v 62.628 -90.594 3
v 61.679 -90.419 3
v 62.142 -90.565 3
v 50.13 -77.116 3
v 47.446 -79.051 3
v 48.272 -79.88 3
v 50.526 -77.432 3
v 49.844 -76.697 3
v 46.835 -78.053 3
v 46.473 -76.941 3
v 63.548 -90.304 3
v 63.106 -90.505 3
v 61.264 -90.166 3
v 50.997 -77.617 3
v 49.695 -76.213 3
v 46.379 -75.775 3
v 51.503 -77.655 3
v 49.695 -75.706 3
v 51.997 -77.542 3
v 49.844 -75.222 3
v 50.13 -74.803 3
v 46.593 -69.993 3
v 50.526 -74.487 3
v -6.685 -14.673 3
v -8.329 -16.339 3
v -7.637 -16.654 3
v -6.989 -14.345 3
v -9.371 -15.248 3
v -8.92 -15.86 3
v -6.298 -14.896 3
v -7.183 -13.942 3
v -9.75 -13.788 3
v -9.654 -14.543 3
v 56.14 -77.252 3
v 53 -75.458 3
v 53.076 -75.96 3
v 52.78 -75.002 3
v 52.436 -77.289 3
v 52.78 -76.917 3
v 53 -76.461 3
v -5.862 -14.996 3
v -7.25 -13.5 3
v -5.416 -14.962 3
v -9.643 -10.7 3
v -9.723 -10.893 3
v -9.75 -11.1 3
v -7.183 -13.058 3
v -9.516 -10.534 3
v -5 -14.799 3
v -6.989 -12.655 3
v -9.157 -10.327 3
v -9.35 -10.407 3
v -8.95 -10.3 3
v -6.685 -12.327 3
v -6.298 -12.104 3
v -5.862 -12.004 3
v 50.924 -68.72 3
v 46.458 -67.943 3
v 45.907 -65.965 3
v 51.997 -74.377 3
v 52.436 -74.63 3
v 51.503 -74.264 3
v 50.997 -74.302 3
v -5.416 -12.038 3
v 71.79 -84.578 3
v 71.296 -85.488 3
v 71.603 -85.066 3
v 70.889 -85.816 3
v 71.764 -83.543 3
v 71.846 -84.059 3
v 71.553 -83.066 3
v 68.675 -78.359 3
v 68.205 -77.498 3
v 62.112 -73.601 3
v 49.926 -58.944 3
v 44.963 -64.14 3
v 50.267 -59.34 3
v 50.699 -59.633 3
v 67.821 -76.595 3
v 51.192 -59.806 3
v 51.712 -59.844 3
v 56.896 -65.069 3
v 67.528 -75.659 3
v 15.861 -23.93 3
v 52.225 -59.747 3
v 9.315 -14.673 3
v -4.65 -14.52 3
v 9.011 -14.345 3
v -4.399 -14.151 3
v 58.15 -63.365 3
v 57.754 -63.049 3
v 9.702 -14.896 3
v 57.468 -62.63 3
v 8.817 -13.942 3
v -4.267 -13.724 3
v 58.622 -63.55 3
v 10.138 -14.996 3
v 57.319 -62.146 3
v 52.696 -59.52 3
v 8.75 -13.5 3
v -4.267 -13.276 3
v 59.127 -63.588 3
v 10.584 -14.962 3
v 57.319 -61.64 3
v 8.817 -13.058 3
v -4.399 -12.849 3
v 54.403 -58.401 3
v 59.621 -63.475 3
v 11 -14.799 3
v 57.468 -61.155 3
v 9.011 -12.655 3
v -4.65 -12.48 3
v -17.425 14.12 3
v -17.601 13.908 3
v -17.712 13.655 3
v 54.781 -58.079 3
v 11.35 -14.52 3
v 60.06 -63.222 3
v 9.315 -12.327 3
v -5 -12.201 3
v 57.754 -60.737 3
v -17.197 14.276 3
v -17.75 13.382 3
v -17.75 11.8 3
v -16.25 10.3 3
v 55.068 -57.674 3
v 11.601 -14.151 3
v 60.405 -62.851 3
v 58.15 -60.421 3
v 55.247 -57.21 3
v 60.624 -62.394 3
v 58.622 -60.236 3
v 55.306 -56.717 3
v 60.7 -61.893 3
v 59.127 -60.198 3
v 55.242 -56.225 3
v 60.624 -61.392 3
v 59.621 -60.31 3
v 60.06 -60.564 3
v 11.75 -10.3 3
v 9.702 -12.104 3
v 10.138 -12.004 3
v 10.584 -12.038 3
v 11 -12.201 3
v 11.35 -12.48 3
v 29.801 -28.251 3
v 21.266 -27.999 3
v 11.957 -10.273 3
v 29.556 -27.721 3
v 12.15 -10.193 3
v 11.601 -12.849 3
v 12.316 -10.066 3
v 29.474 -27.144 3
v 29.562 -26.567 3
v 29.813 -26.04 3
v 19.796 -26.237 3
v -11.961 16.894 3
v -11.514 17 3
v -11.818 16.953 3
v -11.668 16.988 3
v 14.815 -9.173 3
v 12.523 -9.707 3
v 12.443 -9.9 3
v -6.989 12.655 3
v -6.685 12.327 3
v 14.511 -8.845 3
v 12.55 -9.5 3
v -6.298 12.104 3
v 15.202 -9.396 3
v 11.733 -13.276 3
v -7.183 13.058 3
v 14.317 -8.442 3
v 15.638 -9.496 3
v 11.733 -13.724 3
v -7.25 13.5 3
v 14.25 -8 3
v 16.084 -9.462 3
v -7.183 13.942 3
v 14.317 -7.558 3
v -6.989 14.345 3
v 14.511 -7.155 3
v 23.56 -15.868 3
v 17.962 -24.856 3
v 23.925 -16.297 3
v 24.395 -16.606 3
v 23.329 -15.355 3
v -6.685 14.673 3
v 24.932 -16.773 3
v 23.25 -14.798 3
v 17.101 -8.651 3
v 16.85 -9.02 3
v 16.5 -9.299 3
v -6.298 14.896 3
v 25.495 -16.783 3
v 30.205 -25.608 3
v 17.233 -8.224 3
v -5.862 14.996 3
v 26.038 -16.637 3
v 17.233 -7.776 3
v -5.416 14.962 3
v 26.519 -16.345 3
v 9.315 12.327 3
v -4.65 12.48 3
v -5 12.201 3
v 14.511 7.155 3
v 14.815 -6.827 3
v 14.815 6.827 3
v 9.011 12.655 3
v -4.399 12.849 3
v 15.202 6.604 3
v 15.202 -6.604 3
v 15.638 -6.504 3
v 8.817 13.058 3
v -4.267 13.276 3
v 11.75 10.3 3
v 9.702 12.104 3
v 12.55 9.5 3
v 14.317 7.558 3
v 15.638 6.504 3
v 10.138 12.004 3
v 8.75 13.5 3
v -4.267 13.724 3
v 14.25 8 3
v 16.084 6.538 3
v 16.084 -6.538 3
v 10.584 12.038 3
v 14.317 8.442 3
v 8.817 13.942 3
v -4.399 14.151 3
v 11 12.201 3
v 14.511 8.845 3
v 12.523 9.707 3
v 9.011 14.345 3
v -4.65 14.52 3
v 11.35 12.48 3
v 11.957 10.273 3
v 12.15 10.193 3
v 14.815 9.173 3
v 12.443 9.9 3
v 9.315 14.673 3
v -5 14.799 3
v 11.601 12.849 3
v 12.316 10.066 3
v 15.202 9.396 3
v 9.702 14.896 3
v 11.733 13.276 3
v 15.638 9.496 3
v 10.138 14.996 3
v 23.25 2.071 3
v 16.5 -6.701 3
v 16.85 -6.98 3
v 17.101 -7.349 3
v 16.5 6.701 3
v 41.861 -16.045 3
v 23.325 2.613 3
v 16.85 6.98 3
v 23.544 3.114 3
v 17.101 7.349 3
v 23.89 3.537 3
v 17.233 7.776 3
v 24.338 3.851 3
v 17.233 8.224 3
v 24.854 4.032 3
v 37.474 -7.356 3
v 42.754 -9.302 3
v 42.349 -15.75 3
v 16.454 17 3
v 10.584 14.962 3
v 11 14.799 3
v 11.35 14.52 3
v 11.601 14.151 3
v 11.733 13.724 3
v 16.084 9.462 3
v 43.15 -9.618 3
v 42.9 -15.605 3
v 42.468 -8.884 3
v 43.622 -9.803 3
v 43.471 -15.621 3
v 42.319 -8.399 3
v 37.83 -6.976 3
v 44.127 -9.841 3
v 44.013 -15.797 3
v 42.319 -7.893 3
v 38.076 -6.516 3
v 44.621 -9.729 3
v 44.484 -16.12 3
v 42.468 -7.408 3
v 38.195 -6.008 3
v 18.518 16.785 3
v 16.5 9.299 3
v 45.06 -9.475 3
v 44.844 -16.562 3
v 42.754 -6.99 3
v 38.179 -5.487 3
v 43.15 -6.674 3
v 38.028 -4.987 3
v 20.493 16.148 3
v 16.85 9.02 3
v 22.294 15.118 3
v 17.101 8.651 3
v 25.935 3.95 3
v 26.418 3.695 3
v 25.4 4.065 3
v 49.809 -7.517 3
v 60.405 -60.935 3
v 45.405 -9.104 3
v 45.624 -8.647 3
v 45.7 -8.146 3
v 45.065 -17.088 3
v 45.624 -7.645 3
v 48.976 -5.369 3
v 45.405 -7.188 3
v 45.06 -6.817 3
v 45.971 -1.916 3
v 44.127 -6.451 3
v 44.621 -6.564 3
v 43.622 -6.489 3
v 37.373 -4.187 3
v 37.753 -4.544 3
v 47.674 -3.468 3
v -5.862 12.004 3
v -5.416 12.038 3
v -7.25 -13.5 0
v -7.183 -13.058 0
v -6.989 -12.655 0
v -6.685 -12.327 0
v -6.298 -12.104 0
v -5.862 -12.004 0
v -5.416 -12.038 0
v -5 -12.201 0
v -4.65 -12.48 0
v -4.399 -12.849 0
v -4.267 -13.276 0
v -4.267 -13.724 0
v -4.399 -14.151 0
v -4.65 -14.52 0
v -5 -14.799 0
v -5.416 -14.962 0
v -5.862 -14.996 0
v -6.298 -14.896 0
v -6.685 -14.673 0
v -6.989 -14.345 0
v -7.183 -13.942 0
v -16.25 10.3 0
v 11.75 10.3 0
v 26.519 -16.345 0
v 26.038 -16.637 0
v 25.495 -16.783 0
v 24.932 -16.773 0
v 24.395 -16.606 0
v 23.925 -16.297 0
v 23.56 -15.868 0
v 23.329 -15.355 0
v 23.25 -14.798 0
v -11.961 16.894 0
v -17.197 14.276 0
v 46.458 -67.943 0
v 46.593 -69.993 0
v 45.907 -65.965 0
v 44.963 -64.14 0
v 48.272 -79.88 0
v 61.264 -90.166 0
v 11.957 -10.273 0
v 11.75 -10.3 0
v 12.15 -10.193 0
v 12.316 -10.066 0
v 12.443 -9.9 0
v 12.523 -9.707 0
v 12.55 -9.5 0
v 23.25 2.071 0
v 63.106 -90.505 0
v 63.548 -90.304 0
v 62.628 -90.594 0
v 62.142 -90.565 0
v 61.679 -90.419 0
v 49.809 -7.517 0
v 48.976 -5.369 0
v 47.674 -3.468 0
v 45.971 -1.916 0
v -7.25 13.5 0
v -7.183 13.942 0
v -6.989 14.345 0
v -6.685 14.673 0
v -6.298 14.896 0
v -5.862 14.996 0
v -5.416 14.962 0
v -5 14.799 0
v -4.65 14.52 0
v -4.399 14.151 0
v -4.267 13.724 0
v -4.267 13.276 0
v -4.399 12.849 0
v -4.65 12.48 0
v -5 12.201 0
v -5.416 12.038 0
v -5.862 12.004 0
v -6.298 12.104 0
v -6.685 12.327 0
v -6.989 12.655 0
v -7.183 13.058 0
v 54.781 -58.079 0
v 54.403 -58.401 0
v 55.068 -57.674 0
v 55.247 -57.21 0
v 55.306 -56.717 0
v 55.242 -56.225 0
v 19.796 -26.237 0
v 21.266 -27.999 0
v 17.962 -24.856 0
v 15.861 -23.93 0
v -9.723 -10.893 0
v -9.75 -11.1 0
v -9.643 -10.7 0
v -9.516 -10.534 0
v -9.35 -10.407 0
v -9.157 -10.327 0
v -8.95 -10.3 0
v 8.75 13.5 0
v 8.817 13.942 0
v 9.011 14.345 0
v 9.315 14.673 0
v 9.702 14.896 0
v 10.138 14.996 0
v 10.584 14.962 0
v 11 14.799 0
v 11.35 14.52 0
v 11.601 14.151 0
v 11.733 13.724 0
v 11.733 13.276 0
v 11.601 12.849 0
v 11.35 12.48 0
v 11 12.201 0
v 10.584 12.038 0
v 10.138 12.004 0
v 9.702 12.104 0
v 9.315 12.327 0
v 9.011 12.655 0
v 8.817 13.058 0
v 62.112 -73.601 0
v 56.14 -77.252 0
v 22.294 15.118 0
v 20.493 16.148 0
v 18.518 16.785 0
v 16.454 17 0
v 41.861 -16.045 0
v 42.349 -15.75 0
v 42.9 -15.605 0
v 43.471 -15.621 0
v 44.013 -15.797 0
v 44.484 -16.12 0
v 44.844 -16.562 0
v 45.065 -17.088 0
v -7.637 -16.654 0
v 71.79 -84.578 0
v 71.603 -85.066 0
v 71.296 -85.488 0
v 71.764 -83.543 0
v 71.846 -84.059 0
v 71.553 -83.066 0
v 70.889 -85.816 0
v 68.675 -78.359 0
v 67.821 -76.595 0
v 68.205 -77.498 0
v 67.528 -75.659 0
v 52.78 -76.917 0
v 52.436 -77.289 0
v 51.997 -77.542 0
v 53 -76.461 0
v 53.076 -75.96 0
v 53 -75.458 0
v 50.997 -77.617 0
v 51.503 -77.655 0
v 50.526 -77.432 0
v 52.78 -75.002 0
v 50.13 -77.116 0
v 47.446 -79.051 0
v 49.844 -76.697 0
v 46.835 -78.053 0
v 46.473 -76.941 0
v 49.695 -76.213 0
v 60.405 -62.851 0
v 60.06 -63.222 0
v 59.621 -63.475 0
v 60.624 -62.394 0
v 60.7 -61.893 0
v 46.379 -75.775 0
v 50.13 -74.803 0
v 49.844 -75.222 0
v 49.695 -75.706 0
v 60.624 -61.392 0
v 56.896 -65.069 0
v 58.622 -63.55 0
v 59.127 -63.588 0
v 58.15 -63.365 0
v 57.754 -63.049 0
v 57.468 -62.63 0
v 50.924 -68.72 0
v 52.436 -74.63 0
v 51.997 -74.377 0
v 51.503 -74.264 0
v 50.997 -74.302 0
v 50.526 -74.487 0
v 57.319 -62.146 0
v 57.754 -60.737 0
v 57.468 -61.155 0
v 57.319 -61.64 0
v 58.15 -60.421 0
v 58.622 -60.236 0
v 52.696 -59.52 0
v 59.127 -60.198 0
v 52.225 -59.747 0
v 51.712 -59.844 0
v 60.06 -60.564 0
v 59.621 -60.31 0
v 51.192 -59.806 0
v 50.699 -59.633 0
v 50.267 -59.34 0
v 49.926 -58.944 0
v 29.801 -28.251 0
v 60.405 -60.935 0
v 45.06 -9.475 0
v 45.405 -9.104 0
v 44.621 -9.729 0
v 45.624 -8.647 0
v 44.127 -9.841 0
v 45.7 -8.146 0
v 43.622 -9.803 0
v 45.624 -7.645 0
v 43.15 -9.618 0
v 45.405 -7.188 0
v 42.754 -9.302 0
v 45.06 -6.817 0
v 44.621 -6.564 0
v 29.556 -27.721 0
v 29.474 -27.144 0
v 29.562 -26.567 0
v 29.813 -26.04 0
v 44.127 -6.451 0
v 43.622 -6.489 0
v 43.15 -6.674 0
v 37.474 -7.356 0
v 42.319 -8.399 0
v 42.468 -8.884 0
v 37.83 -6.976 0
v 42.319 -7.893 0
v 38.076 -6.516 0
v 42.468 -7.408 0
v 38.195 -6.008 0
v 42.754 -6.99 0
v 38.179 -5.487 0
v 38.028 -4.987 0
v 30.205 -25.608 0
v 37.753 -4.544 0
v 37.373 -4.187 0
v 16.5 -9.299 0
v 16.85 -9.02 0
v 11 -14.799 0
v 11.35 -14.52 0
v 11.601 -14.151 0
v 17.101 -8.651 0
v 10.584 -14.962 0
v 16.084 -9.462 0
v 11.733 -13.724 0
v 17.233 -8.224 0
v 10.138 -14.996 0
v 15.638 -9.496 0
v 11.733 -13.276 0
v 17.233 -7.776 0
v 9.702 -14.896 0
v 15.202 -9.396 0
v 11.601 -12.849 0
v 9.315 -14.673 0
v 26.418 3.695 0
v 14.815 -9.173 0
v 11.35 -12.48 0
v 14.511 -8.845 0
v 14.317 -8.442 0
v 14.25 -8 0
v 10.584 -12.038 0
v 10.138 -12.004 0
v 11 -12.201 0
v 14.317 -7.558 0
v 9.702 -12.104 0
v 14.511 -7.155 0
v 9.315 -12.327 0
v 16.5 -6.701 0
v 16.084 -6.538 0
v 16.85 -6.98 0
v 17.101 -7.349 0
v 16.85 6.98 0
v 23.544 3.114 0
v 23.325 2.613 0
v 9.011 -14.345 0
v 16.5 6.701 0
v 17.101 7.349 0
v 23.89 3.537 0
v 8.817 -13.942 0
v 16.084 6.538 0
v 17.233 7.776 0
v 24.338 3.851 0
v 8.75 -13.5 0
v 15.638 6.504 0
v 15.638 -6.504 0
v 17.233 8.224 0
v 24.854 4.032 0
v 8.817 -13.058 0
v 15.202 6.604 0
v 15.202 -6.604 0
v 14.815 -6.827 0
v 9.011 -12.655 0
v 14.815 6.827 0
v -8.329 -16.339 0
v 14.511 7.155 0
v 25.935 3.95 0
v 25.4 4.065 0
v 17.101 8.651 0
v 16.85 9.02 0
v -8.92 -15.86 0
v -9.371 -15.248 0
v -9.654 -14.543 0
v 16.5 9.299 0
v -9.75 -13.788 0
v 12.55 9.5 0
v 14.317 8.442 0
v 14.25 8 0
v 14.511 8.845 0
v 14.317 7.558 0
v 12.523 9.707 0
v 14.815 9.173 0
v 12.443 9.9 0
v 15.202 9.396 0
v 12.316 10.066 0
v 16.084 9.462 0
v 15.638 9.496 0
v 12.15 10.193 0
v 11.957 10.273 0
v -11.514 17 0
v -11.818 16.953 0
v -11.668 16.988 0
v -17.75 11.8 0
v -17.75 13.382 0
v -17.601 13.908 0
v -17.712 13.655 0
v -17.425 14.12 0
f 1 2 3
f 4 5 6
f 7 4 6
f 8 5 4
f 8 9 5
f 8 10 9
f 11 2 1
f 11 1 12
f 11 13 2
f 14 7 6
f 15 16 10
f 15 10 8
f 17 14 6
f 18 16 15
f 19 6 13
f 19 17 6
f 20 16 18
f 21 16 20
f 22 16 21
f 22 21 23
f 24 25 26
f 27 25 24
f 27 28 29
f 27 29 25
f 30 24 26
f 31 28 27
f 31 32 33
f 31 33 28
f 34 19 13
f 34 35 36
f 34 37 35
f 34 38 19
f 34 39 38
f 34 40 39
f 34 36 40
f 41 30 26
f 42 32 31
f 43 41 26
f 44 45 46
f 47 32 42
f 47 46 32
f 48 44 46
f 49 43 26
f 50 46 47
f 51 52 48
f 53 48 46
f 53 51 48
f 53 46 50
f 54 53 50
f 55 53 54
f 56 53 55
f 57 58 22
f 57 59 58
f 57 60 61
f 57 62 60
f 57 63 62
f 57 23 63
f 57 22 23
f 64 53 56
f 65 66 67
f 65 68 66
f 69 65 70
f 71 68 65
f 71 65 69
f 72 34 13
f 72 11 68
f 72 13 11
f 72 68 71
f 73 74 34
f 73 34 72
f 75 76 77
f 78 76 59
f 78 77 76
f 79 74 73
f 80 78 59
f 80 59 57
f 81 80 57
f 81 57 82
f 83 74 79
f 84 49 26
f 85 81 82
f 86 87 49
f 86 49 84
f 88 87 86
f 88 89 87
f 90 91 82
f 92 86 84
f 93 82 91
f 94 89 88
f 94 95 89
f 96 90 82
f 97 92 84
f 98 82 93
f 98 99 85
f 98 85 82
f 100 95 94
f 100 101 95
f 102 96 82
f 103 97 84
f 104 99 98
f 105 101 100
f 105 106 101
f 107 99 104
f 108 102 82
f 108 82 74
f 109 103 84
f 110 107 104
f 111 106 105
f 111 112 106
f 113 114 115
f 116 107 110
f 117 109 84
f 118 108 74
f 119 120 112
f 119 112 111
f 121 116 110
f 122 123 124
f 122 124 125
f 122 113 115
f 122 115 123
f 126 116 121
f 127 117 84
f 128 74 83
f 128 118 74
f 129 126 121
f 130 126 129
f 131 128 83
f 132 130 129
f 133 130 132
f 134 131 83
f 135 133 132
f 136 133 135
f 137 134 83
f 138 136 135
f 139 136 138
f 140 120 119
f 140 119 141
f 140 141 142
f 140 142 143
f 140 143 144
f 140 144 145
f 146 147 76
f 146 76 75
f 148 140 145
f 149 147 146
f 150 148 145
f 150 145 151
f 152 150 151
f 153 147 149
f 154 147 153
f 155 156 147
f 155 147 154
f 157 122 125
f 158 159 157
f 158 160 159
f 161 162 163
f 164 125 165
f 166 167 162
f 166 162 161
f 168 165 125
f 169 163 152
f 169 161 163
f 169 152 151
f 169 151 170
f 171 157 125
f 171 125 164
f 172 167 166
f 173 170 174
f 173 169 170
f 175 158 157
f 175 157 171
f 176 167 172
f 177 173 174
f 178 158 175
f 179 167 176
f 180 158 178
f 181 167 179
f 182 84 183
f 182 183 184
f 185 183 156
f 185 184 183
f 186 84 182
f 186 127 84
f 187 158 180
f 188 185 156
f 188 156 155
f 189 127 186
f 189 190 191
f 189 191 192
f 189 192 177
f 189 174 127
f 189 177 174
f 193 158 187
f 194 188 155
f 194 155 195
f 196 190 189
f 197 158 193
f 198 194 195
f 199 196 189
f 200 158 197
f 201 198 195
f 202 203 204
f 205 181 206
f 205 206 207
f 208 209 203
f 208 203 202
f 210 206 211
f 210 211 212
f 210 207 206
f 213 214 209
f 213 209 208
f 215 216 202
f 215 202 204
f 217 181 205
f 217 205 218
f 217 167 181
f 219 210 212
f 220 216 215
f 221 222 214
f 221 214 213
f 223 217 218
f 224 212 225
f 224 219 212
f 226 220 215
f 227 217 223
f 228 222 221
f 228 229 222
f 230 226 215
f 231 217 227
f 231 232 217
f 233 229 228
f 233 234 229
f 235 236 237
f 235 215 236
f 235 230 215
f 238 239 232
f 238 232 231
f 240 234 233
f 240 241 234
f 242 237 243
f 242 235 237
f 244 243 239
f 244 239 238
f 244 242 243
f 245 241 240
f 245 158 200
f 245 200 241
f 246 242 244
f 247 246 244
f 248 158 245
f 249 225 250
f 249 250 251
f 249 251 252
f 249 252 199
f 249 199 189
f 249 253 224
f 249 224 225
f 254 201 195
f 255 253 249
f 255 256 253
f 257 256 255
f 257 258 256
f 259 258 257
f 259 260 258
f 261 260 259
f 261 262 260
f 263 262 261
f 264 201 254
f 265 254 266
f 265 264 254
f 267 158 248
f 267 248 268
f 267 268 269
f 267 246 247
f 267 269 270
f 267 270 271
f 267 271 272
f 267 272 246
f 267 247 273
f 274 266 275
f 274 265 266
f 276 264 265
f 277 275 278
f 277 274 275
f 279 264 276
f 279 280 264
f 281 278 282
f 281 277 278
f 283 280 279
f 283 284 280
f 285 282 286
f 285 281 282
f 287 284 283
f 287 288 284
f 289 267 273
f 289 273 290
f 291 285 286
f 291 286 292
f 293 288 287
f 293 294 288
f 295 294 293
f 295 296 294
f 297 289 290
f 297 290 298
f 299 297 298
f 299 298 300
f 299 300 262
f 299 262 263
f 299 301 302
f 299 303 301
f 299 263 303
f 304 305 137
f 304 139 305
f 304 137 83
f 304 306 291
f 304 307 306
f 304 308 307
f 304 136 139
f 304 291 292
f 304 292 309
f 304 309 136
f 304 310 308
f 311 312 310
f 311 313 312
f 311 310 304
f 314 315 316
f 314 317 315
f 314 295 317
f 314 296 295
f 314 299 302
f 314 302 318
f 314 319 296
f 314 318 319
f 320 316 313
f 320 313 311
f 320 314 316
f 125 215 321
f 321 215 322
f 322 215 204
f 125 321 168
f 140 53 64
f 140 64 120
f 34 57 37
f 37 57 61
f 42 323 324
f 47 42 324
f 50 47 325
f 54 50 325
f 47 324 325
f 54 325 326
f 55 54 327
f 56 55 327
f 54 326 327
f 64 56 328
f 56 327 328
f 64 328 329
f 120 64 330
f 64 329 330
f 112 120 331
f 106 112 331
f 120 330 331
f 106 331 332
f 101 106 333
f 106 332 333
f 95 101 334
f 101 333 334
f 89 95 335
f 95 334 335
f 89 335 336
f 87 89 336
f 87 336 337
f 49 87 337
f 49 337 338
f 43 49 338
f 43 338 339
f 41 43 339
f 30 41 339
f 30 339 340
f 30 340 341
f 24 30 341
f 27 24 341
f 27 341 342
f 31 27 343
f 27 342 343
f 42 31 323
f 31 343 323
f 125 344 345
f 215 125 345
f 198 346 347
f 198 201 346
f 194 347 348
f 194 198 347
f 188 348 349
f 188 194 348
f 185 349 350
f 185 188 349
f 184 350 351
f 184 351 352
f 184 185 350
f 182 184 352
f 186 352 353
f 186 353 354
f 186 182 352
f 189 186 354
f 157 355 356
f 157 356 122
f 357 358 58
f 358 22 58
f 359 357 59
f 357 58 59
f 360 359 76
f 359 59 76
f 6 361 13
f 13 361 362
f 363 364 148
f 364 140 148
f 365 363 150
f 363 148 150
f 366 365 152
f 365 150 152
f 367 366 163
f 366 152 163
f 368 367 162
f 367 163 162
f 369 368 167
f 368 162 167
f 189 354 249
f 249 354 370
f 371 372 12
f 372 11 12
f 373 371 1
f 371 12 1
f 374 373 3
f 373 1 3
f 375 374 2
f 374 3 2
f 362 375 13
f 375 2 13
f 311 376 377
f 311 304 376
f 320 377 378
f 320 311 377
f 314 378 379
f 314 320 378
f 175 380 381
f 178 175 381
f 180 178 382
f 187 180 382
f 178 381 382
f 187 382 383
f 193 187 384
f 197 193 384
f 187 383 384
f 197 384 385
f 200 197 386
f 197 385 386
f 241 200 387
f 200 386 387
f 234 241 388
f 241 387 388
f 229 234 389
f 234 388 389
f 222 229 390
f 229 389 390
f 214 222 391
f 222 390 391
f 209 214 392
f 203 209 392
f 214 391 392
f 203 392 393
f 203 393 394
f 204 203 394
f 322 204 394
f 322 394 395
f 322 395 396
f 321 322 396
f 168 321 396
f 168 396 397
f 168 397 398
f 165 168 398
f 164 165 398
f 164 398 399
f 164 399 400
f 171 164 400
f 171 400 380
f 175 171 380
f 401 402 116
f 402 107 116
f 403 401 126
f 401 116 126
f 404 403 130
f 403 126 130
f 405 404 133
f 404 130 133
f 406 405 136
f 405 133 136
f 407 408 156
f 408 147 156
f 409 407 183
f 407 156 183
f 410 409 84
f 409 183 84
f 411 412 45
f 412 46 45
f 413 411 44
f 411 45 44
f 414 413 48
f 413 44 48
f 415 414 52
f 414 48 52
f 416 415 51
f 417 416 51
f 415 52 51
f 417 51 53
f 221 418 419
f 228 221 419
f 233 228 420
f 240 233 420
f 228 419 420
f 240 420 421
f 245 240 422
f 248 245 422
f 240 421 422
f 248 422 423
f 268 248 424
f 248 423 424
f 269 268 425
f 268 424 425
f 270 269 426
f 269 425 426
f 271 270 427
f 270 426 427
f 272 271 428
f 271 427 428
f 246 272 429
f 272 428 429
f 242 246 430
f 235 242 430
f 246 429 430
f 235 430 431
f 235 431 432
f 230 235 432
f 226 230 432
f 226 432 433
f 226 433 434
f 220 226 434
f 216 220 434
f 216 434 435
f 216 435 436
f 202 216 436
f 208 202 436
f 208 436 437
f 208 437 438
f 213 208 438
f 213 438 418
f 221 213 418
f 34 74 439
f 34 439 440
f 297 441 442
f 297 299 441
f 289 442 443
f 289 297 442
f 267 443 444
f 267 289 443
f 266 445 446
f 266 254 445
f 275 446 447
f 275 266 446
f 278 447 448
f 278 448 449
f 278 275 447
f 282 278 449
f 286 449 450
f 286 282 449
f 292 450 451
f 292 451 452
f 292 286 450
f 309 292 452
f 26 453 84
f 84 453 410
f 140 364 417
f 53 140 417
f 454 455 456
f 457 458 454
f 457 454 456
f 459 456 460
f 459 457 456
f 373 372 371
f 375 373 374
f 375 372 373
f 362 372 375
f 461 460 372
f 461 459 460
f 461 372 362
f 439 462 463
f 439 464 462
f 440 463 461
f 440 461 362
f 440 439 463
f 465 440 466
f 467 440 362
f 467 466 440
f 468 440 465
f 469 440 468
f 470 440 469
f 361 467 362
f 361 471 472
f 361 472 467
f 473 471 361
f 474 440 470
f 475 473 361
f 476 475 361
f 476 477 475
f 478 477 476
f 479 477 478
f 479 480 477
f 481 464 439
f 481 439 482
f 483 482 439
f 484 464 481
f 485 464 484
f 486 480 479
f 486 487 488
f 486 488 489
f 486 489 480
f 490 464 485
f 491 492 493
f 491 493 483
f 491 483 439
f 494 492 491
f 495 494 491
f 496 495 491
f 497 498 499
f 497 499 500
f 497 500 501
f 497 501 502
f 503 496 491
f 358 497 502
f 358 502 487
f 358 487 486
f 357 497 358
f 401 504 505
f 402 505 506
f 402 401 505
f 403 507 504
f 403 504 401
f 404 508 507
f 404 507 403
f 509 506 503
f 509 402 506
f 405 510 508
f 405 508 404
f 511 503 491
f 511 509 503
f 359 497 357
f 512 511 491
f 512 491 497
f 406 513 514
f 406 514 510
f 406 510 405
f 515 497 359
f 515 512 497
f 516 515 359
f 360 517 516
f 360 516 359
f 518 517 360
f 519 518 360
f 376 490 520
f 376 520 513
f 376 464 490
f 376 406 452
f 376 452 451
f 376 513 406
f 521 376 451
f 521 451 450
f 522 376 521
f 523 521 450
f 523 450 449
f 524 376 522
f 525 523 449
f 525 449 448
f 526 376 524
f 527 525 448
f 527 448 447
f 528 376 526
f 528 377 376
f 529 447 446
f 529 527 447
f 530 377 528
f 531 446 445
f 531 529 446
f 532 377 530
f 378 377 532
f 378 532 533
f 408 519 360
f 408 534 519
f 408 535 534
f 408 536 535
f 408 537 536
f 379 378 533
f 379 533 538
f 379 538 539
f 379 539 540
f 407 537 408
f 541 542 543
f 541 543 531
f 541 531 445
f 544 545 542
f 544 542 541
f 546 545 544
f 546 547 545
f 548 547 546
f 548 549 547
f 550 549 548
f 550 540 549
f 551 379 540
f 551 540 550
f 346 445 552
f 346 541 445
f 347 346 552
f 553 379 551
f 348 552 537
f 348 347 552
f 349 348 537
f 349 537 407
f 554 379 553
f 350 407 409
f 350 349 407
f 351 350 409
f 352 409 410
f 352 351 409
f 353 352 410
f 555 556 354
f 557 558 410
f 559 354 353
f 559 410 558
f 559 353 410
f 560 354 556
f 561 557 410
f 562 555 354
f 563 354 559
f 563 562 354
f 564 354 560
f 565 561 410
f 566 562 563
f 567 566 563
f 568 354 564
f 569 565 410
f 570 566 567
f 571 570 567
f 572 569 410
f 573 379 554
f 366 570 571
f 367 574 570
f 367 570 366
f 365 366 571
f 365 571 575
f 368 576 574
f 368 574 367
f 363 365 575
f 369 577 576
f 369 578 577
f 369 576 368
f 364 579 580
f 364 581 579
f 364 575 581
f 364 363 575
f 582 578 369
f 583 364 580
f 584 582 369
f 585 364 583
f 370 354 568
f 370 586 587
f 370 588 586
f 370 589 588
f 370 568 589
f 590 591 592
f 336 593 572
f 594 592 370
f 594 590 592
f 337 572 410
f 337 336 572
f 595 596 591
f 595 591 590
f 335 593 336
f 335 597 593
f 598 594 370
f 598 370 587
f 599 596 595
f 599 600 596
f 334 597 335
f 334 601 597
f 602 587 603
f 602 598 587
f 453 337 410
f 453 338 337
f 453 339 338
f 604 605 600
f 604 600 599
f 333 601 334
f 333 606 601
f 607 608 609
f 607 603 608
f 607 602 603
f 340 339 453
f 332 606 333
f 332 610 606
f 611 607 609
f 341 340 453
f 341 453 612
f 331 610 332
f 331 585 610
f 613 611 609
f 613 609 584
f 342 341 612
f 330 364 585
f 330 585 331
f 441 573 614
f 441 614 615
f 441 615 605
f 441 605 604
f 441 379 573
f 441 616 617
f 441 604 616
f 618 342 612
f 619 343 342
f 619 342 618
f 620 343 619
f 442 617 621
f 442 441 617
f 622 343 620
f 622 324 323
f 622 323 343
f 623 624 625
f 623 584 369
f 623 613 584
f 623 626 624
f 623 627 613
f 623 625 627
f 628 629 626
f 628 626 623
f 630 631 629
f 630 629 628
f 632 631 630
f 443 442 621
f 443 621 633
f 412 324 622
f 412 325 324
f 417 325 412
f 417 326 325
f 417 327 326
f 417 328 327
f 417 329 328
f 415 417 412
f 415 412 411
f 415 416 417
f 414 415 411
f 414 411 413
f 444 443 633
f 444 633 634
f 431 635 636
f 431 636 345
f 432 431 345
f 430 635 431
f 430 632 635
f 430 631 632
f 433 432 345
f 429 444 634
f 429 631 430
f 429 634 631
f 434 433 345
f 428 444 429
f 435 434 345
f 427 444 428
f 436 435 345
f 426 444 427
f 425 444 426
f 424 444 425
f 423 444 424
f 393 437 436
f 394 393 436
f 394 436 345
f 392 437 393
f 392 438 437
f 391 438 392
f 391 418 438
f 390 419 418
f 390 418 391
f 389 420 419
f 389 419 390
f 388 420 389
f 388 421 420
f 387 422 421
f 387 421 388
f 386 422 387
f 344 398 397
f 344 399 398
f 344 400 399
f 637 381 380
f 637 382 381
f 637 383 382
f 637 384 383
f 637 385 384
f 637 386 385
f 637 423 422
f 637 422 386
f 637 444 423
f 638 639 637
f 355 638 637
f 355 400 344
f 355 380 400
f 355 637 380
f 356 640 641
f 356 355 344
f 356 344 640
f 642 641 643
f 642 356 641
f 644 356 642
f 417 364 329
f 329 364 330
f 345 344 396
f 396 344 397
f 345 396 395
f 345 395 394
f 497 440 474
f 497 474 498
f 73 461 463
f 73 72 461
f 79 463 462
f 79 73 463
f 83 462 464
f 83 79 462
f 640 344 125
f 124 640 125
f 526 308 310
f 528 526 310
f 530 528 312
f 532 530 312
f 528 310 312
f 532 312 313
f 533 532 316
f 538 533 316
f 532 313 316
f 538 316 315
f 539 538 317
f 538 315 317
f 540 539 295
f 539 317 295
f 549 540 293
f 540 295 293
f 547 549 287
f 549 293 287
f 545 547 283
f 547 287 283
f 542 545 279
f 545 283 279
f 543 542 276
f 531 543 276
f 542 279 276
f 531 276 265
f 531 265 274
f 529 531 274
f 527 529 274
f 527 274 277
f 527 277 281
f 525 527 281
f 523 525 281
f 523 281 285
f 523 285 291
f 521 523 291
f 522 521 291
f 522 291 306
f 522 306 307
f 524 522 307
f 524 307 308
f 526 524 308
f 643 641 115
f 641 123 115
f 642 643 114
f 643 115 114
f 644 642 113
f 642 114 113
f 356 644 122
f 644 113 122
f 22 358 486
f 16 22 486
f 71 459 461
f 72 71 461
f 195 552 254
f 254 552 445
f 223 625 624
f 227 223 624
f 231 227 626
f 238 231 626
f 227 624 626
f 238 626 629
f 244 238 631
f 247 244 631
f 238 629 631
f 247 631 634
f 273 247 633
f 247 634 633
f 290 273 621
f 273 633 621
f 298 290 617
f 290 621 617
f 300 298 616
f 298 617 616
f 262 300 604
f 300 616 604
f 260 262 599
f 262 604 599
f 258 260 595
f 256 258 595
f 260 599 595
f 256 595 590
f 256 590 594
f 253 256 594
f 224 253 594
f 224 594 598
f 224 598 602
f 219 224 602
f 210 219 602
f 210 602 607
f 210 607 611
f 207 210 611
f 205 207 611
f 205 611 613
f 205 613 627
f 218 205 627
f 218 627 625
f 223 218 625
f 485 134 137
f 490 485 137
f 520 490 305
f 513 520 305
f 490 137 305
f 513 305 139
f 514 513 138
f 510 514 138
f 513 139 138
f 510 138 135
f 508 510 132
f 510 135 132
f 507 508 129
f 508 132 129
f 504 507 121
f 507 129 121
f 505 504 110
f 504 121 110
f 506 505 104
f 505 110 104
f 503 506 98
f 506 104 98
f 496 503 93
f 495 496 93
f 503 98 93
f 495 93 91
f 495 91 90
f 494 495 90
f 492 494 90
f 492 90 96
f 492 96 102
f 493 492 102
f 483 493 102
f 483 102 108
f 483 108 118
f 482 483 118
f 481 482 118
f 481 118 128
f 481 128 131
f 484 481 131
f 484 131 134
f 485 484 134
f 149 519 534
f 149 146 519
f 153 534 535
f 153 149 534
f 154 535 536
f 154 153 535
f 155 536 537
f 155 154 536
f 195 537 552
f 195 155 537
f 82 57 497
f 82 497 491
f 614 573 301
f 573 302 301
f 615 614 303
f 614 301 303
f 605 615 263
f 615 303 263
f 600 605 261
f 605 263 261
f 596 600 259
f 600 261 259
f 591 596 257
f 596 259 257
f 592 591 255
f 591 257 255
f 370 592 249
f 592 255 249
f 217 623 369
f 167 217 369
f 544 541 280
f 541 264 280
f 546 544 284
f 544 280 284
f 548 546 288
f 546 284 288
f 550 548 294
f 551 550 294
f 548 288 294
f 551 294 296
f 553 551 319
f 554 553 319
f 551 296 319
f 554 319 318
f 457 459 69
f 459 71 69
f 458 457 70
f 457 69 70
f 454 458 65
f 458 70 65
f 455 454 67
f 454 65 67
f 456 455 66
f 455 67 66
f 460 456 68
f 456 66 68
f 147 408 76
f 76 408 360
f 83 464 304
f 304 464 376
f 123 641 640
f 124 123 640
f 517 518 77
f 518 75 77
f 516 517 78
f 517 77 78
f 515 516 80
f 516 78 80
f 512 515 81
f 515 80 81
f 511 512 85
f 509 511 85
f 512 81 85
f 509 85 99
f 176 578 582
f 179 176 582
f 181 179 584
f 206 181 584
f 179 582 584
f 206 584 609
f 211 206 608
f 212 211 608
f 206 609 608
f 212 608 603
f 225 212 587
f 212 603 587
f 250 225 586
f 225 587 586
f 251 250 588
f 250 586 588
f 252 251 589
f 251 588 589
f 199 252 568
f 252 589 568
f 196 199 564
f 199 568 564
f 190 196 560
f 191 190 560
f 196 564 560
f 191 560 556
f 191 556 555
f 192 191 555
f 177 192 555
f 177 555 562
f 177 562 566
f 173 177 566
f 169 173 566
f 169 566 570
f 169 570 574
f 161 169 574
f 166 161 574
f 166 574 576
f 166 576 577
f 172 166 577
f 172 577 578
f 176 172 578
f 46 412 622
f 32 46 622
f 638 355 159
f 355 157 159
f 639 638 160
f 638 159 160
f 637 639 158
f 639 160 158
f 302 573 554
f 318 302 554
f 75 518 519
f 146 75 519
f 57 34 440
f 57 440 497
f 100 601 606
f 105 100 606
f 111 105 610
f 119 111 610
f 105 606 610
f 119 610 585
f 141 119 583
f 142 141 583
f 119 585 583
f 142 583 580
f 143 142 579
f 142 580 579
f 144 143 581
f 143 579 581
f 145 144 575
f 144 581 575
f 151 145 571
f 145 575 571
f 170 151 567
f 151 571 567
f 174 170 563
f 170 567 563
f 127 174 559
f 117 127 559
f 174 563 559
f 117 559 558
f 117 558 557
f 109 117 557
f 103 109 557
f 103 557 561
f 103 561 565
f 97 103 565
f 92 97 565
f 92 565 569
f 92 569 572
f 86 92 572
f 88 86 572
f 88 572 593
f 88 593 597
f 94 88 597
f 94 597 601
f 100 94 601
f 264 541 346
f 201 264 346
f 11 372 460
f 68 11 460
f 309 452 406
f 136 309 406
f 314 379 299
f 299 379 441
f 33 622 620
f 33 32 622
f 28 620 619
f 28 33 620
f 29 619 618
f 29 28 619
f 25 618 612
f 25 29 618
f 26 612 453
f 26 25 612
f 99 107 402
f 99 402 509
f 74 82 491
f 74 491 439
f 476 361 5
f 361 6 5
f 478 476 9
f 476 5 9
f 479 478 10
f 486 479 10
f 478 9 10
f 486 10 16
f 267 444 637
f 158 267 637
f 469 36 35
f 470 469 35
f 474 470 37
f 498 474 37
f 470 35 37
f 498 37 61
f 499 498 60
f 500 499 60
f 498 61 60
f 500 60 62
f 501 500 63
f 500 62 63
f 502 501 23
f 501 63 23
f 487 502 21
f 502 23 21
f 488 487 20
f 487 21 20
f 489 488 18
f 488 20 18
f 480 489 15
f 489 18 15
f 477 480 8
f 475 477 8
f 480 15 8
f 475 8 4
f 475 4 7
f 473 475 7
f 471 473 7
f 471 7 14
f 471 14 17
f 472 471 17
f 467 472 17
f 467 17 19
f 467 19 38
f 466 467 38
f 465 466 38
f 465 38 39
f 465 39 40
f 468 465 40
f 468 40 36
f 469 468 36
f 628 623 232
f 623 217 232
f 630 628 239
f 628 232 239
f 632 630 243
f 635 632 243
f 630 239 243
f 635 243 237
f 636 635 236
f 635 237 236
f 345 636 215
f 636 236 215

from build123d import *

# Parameters (mm, degrees)
BOSS_EXTRU_1_DEPTH      = 3
D_GAGEMENT_M21_D        = 3
CHANFREIN1_SIZE         = 1.5
CHANFREIN2_SIZE         = 6
CHANFREIN2_SIZE2        = 3
CONG_1_R                = 2
CONG_2_R                = 10
CONG_2_2_R              = 5
CONG_3_R                = 0.8
D_GAGEMENT_M31_D        = 3.4
ENL_V_MAT_EXTRU_1_REACH = 5
FILLET_1_R              = 3
FILLET_2_R              = 1
SKETCH_5_R              = 1.5
CUT_EXTRUDE_2_DEPTH     = 3
SKETCH_6_R              = 1.5
EXTRUDE_3_DEPTH         = 3


with BuildPart() as part:
    # Esquisse1 → Boss.-Extru.1 (new body)
    with BuildSketch(Plane.XY):
        Polygon((48.900602827, -4.024), (19.677471167, 17), (-17.75, 17), (-17.75, 10.3), (12.55, 10.3), (12.55, -10.3), (-9.75, -10.3), (-9.75, -16), (19.295179393, -24.993298238), (46.71123265, -66.806693506), (46.285412403, -78.306693506), (62.357629227, -91.032016541), (72.595795313, -84.772627178), (67.901253291, -77.094002614), align=None)
        Polygon((28.816069815, -26.747772307), (44.278044238, -14.062058021), (55.602935243, -57.613715208), (51.023072953, -60.616622474), align=None, mode=Mode.SUBTRACT)
        Polygon((23.25, -19.026221012), (23.25, 5.973778988), (39.485073144, -5.706221012), align=None, mode=Mode.SUBTRACT)
    extrude(amount=BOSS_EXTRU_1_DEPTH)

    # D_gagement M21 (through all)
    with Locations(Plane.XY.offset(3)):
        with Locations((-13.75, 13.5), (-5.75, 13.5), (2.25, 13.5), (10.25, 13.5), (15.75, 8), (15.75, -8), (10.25, -13.5)):
            Hole(D_GAGEMENT_M21_D / 2)

    # Chanfrein1
    chanfrein1_edges = [part.edges().sort_by_distance(p)[0] for p in [
        (-17.75, 10.3, 1.5),
    ]]
    chamfer(chanfrein1_edges, length=CHANFREIN1_SIZE)

    # Chanfrein2
    chanfrein2_edges = [part.edges().sort_by_distance(p)[0] for p in [
        (-17.75, 17, 1.5),
    ]]
    chanfrein2_side = [part.faces().sort_by_distance(p)[0] for p in [
        (0.963735584, 17, 1.5),
    ]]
    chamfer(chanfrein2_edges, length=CHANFREIN2_SIZE, length2=CHANFREIN2_SIZE2, reference=chanfrein2_side[0])

    # Cong_1
    cong_1_edges = [part.edges().sort_by_distance(p)[0] for p in [
        (72.595795313, -84.772627178, 1.5),
        (62.357629227, -91.032016541, 1.5),
        (23.25, 5.973778988, 1.5),
        (23.25, -19.026221012, 1.5),
        (39.485073144, -5.706221012, 1.5),
        (51.023072953, -60.616622474, 1.5),
        (55.602935243, -57.613715208, 1.5),
        (44.278044238, -14.062058021, 1.5),
        (28.816069815, -26.747772307, 1.5),
    ]]
    fillet(cong_1_edges, radius=CONG_1_R)

    # Cong_2
    cong_2_edges = [part.edges().sort_by_distance(p)[0] for p in [
        (19.677471167, 17, 1.5),
        (48.900602827, -4.024, 1.5),
        (19.295179393, -24.993298238, 1.5),
        (46.71123265, -66.806693506, 1.5),
        (67.901253291, -77.094002614, 1.5),
    ]]
    fillet(cong_2_edges, radius=CONG_2_R)

    # Cong_2 2
    cong_2_2_edges = [part.edges().sort_by_distance(p)[0] for p in [
        (46.285412403, -78.306693506, 1.5),
    ]]
    fillet(cong_2_2_edges, radius=CONG_2_2_R)

    # Cong_3
    cong_3_edges = [part.edges().sort_by_distance(p)[0] for p in [
        (-9.75, -10.3, 1.5),
        (12.55, -10.3, 1.5),
        (12.55, 10.3, 1.5),
    ]]
    fillet(cong_3_edges, radius=CONG_3_R)

    # D_gagement M31 (through all)
    with Locations(Plane(origin=(0, 0, 0), x_dir=(-1, 0, 0), z_dir=(0, 0, -1))):
        with Locations((-44, -8.146072926), (-59, -61.892892977), (-51.375748619, -75.959548261)):
            Hole(D_GAGEMENT_M31_D / 2)

    # Esquisse6 → Enl_v. mat.-Extru.1 (cut, up to next)
    with BuildSketch(Plane.XY.offset(3), mode=Mode.PRIVATE) as enl_v_mat_extru_1_sk1:
        Polygon((50.923621455, -68.720394376), (56.895885005, -65.069083914), (62.112042808, -73.600888985), (56.139779258, -77.252199447), align=None)
    enl_v_mat_extru_1_tool1 = extrude(enl_v_mat_extru_1_sk1.sketch, amount=-ENL_V_MAT_EXTRU_1_REACH, mode=Mode.PRIVATE) & part.part
    add(enl_v_mat_extru_1_tool1.solids().sort_by_distance((56.517832, -71.160642, 3))[0], mode=Mode.SUBTRACT)

    # Fillet 1
    fillet_1_edges = [part.edges().sort_by_distance(p)[0] for p in [
        (-9.75, -16, 1.5),
    ]]
    fillet(fillet_1_edges, radius=FILLET_1_R)

    # Fillet 2
    fillet_2_edges = [part.edges().sort_by_distance(p)[0] for p in [
        (-17.75, 14, 1.5),
        (-11.75, 17, 1.5),
    ]]
    fillet(fillet_2_edges, radius=FILLET_2_R)

    # Sketch 5 → Cut-Extrude 2 (cut)
    with BuildSketch(Plane(origin=(0, 0, 0), x_dir=(-1, 0, 0), z_dir=(0, 0, -1))):
        with Locations((5.75, -13.5)):
            Circle(SKETCH_5_R)
    extrude(amount=-CUT_EXTRUDE_2_DEPTH, mode=Mode.SUBTRACT)

    # Sketch 6 → Extrude 3 (add)
    with BuildSketch(Plane(origin=(0, 0, 0), x_dir=(-1, 0, 0), z_dir=(0, 0, -1))):
        with Locations((13.75, 13.5)):
            Circle(SKETCH_6_R)
        with Locations((-2.25, 13.5)):
            Circle(SKETCH_6_R)
    extrude(amount=-EXTRUDE_3_DEPTH)


solid = part.part
